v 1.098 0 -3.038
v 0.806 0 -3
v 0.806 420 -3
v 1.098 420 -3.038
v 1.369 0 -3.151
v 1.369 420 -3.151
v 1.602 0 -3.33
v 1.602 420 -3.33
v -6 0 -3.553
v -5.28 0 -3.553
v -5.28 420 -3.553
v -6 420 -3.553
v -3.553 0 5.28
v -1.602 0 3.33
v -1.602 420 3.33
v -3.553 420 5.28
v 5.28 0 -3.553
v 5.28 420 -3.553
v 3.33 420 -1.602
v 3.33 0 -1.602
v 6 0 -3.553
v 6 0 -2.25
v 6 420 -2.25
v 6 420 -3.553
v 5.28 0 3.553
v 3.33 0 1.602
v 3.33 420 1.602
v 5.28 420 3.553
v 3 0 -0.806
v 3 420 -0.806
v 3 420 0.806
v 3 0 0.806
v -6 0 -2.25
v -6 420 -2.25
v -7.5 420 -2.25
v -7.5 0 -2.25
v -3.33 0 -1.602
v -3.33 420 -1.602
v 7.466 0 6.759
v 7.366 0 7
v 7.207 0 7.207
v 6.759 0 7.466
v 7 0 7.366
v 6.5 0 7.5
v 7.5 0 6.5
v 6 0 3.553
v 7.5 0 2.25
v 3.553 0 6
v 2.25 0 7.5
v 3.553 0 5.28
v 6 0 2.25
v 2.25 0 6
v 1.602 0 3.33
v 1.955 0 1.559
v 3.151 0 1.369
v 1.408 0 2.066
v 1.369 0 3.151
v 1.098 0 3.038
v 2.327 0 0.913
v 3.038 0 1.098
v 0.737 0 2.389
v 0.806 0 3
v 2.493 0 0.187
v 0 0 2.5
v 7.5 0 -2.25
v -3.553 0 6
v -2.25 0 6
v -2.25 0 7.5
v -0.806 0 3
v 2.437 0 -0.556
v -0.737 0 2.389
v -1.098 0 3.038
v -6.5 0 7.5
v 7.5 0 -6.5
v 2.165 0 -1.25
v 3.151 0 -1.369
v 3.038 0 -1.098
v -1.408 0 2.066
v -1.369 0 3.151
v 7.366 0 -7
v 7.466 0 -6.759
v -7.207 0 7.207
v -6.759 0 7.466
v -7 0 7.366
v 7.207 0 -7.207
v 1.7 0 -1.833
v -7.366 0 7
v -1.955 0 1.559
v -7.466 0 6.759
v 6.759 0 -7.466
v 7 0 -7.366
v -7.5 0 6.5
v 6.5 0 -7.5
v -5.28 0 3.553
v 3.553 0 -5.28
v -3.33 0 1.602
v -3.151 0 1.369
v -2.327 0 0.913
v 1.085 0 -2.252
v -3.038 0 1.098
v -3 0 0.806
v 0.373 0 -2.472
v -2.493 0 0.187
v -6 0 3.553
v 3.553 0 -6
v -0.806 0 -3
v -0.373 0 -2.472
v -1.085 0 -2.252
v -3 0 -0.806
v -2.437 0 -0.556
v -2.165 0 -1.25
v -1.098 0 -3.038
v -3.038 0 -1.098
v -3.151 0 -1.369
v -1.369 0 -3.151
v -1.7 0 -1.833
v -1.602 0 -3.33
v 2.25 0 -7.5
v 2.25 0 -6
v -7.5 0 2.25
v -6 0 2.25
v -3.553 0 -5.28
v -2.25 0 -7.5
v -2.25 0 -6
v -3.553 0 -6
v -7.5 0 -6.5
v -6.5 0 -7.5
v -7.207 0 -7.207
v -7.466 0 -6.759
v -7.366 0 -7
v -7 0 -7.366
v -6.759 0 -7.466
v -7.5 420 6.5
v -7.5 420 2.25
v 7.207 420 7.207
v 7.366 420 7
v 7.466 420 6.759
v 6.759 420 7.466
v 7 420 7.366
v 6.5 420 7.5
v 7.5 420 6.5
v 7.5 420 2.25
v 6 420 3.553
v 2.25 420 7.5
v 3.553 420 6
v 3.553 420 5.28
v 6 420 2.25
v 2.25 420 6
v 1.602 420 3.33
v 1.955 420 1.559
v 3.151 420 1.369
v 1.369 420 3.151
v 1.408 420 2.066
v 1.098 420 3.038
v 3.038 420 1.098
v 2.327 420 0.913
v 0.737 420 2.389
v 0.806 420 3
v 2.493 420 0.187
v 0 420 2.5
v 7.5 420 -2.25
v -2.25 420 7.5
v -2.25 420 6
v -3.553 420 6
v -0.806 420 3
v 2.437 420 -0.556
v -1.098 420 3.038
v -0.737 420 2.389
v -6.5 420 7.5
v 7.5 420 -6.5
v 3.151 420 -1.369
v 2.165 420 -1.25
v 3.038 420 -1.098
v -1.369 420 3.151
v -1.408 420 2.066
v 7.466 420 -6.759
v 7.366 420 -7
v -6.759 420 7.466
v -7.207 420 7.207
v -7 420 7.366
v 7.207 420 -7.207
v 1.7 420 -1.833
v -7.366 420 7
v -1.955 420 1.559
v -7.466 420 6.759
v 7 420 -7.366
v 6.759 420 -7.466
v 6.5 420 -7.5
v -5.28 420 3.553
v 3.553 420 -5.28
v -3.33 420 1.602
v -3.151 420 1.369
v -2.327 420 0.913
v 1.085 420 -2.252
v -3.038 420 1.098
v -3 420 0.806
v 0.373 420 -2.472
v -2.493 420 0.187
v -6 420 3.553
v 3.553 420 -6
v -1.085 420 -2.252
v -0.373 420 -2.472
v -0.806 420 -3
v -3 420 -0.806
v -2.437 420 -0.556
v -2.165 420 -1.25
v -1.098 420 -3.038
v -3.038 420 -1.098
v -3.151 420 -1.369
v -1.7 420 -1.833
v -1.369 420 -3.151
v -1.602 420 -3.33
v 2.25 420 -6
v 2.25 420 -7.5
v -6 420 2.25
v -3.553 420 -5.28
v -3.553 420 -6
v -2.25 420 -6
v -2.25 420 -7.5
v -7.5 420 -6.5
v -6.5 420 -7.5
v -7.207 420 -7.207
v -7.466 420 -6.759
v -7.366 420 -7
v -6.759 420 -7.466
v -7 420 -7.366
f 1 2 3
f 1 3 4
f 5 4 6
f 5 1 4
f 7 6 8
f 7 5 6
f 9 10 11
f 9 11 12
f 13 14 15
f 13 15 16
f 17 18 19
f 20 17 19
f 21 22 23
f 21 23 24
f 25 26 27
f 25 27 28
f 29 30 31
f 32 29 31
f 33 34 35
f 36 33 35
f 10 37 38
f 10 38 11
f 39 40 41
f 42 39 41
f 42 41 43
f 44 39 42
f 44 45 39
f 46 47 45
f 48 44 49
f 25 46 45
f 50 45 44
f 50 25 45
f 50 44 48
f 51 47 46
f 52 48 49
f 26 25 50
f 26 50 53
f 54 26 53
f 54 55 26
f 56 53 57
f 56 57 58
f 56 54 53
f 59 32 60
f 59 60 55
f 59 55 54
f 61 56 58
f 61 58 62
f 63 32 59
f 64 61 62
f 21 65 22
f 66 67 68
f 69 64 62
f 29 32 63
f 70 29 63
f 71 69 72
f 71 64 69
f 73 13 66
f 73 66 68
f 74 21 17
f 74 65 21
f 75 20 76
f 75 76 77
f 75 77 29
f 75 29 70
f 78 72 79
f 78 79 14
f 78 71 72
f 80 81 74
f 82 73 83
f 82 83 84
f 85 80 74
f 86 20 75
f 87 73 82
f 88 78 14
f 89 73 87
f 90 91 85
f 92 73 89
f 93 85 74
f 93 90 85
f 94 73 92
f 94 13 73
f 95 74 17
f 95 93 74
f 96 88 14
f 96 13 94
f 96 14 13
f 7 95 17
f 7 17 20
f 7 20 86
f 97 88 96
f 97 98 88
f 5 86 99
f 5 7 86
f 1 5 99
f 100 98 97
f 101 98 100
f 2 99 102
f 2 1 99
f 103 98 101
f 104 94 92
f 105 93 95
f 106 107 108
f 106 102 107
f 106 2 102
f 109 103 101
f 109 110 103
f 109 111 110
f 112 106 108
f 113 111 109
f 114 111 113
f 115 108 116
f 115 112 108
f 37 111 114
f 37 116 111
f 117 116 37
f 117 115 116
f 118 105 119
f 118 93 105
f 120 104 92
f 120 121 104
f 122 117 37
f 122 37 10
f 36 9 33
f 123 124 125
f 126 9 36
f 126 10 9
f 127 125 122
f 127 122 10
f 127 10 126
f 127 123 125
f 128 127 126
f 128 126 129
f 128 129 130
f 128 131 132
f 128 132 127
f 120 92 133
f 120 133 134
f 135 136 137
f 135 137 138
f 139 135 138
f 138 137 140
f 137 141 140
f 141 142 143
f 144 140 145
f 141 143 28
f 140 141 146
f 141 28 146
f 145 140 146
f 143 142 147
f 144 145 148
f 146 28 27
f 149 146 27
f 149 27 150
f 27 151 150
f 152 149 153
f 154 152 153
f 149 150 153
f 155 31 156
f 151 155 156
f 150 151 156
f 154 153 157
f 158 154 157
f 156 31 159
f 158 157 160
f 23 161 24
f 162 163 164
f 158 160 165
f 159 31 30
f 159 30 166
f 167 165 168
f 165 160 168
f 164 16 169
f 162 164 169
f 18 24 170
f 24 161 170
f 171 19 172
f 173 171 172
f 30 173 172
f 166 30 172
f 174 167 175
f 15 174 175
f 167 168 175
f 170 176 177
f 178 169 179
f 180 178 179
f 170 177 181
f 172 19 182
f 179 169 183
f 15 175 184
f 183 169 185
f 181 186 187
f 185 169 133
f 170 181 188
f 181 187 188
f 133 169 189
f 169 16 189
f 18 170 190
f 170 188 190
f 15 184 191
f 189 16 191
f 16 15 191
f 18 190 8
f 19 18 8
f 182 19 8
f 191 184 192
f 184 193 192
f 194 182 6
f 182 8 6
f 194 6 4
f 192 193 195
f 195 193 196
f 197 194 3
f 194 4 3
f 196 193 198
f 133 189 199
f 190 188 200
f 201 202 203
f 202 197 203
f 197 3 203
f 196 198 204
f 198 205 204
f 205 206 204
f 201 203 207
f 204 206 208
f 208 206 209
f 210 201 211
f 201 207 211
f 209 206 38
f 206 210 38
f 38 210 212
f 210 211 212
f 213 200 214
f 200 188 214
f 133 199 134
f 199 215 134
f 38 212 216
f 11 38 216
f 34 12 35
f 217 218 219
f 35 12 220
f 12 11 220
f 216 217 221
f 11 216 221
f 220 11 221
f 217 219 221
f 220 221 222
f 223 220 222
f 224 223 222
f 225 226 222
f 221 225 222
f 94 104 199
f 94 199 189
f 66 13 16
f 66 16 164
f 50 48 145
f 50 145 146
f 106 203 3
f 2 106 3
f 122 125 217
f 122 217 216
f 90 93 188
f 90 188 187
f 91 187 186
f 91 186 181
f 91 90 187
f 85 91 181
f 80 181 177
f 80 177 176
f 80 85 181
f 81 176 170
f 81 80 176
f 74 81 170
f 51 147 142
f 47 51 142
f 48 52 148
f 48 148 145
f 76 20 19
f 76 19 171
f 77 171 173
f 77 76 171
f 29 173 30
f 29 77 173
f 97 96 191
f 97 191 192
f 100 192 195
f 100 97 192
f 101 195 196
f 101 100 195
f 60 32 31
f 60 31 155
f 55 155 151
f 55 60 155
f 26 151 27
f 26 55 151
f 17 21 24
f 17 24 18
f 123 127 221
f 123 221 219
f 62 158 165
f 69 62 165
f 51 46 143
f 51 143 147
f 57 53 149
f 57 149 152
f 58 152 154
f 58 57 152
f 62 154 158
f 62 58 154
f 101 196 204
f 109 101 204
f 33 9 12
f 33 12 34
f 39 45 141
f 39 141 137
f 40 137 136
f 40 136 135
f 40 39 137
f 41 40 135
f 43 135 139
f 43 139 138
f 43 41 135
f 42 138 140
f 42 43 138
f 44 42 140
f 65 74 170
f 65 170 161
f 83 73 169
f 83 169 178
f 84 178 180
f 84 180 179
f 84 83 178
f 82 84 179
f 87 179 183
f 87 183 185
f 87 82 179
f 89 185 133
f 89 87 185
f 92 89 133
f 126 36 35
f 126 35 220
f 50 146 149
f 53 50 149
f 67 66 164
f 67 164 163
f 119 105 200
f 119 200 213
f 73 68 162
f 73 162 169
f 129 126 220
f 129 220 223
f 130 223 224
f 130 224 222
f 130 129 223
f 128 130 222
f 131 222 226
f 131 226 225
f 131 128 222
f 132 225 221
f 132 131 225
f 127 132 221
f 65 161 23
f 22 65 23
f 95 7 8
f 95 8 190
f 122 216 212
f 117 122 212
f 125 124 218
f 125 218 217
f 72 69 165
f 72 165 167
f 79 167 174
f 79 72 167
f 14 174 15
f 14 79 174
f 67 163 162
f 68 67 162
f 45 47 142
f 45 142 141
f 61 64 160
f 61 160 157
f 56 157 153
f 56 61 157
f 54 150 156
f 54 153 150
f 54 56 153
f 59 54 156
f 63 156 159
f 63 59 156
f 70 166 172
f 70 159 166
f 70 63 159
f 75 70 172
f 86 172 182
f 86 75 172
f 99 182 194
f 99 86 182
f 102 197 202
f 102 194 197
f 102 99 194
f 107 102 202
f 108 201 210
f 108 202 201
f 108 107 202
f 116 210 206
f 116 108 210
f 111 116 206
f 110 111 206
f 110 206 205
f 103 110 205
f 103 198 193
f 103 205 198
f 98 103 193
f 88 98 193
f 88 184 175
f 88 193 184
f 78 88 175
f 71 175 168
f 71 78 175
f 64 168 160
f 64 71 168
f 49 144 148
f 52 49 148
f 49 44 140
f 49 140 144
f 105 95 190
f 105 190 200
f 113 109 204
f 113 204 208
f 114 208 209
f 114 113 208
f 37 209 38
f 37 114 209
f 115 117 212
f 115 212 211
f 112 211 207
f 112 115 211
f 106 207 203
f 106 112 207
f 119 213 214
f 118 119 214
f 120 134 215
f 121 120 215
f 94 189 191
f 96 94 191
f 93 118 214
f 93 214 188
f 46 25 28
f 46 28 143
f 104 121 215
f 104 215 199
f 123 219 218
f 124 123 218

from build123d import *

# Parameters (mm, degrees)
BOSS_EXTRUDE1_DEPTH     = 420
CUT_EXTRUDE1_DEPTH      = 421.133907225
CUT_EXTRUDE1_DEPTH_BACK = 421.133907225
SKETCH3_R               = 2.5


with BuildPart() as part:
    # Sketch1 → Boss-Extrude1 (new body)
    with BuildSketch(Plane(origin=(0, 0, 0), x_dir=(1, 0, 0), z_dir=(0, 1, 0))):
        with BuildLine():
            Line((-6.5, 7.5), (-2.25, 7.5))
            Line((-2.25, 7.5), (-2.25, 6))
            Line((-2.25, 6), (-3.552594335, 6))
            Line((-3.552594335, 6), (-3.552594335, 5.280183676))
            Line((-3.552594335, 5.280183676), (-1.60191553, 3.329504871))
            ThreePointArc((-1.60191553, 3.329504871), (-1.236939263, 3.085635526), (-0.806420401, 3))
            Line((-0.806420401, 3), (0.806420401, 3))
            ThreePointArc((0.806420401, 3), (1.236939263, 3.085635526), (1.60191553, 3.329504871))
            Line((1.60191553, 3.329504871), (3.552594335, 5.280183676))
            Line((3.552594335, 5.280183676), (3.552594335, 6))
            Line((3.552594335, 6), (2.25, 6))
            Line((2.25, 6), (2.25, 7.5))
            Line((2.25, 7.5), (6.5, 7.5))
            ThreePointArc((6.5, 7.5), (7.207106781, 7.207106781), (7.5, 6.5))
            Line((7.5, 6.5), (7.5, 2.25))
            Line((7.5, 2.25), (6, 2.25))
            Line((6, 2.25), (6, 3.552594335))
            Line((6, 3.552594335), (5.280183676, 3.552594335))
            Line((5.280183676, 3.552594335), (3.329504871, 1.60191553))
            ThreePointArc((3.329504871, 1.60191553), (3.085635526, 1.236939263), (3, 0.806420401))
            Line((3, 0.806420401), (3, -0.806420401))
            ThreePointArc((3, -0.806420401), (3.085635526, -1.236939263), (3.329504871, -1.60191553))
            Line((3.329504871, -1.60191553), (5.280183676, -3.552594335))
            Line((5.280183676, -3.552594335), (6, -3.552594335))
            Line((6, -3.552594335), (6, -2.25))
            Line((6, -2.25), (7.5, -2.25))
            Line((7.5, -2.25), (7.5, -6.5))
            ThreePointArc((7.5, -6.5), (7.207106781, -7.207106781), (6.5, -7.5))
            Line((6.5, -7.5), (2.25, -7.5))
            Line((2.25, -7.5), (2.25, -6))
            Line((2.25, -6), (3.552594335, -6))
            Line((3.552594335, -6), (3.552594335, -5.280183676))
            Line((3.552594335, -5.280183676), (1.60191553, -3.329504871))
            ThreePointArc((1.60191553, -3.329504871), (1.236939263, -3.085635526), (0.806420401, -3))
            Line((0.806420401, -3), (-0.806420401, -3))
            ThreePointArc((-0.806420401, -3), (-1.236939263, -3.085635526), (-1.60191553, -3.329504871))
            Line((-1.60191553, -3.329504871), (-3.552594335, -5.280183676))
            Line((-3.552594335, -5.280183676), (-3.552594335, -6))
            Line((-3.552594335, -6), (-2.25, -6))
            Line((-2.25, -6), (-2.25, -7.5))
            Line((-2.25, -7.5), (-6.5, -7.5))
            ThreePointArc((-6.5, -7.5), (-7.207106781, -7.207106781), (-7.5, -6.5))
            Line((-7.5, -6.5), (-7.5, -2.25))
            Line((-7.5, -2.25), (-6, -2.25))
            Line((-6, -2.25), (-6, -3.552594335))
            Line((-6, -3.552594335), (-5.280183676, -3.552594335))
            Line((-5.280183676, -3.552594335), (-3.329504871, -1.60191553))
            ThreePointArc((-3.329504871, -1.60191553), (-3.085635526, -1.236939263), (-3, -0.806420401))
            Line((-3, -0.806420401), (-3, 0.806420401))
            ThreePointArc((-3, 0.806420401), (-3.085635526, 1.236939263), (-3.329504871, 1.60191553))
            Line((-3.329504871, 1.60191553), (-5.280183676, 3.552594335))
            Line((-5.280183676, 3.552594335), (-6, 3.552594335))
            Line((-6, 3.552594335), (-6, 2.25))
            Line((-6, 2.25), (-7.5, 2.25))
            Line((-7.5, 2.25), (-7.5, 6.5))
            ThreePointArc((-7.5, 6.5), (-7.207106781, 7.207106781), (-6.5, 7.5))
        make_face()
    extrude(amount=BOSS_EXTRUDE1_DEPTH)

    # Sketch3 → Cut-Extrude1 (cut, two sides: drawn at the far end of the back side and taken through both)
    with BuildSketch(Plane(origin=(0, 420, 0), x_dir=(1, 0, 0), z_dir=(0, 1, 0)).offset(-CUT_EXTRUDE1_DEPTH_BACK)):
        with Locations(Location((0, 0, 0), (0, 0, 270))):
            Circle(SKETCH3_R)
    extrude(amount=CUT_EXTRUDE1_DEPTH + CUT_EXTRUDE1_DEPTH_BACK, mode=Mode.SUBTRACT)


solid = part.part
